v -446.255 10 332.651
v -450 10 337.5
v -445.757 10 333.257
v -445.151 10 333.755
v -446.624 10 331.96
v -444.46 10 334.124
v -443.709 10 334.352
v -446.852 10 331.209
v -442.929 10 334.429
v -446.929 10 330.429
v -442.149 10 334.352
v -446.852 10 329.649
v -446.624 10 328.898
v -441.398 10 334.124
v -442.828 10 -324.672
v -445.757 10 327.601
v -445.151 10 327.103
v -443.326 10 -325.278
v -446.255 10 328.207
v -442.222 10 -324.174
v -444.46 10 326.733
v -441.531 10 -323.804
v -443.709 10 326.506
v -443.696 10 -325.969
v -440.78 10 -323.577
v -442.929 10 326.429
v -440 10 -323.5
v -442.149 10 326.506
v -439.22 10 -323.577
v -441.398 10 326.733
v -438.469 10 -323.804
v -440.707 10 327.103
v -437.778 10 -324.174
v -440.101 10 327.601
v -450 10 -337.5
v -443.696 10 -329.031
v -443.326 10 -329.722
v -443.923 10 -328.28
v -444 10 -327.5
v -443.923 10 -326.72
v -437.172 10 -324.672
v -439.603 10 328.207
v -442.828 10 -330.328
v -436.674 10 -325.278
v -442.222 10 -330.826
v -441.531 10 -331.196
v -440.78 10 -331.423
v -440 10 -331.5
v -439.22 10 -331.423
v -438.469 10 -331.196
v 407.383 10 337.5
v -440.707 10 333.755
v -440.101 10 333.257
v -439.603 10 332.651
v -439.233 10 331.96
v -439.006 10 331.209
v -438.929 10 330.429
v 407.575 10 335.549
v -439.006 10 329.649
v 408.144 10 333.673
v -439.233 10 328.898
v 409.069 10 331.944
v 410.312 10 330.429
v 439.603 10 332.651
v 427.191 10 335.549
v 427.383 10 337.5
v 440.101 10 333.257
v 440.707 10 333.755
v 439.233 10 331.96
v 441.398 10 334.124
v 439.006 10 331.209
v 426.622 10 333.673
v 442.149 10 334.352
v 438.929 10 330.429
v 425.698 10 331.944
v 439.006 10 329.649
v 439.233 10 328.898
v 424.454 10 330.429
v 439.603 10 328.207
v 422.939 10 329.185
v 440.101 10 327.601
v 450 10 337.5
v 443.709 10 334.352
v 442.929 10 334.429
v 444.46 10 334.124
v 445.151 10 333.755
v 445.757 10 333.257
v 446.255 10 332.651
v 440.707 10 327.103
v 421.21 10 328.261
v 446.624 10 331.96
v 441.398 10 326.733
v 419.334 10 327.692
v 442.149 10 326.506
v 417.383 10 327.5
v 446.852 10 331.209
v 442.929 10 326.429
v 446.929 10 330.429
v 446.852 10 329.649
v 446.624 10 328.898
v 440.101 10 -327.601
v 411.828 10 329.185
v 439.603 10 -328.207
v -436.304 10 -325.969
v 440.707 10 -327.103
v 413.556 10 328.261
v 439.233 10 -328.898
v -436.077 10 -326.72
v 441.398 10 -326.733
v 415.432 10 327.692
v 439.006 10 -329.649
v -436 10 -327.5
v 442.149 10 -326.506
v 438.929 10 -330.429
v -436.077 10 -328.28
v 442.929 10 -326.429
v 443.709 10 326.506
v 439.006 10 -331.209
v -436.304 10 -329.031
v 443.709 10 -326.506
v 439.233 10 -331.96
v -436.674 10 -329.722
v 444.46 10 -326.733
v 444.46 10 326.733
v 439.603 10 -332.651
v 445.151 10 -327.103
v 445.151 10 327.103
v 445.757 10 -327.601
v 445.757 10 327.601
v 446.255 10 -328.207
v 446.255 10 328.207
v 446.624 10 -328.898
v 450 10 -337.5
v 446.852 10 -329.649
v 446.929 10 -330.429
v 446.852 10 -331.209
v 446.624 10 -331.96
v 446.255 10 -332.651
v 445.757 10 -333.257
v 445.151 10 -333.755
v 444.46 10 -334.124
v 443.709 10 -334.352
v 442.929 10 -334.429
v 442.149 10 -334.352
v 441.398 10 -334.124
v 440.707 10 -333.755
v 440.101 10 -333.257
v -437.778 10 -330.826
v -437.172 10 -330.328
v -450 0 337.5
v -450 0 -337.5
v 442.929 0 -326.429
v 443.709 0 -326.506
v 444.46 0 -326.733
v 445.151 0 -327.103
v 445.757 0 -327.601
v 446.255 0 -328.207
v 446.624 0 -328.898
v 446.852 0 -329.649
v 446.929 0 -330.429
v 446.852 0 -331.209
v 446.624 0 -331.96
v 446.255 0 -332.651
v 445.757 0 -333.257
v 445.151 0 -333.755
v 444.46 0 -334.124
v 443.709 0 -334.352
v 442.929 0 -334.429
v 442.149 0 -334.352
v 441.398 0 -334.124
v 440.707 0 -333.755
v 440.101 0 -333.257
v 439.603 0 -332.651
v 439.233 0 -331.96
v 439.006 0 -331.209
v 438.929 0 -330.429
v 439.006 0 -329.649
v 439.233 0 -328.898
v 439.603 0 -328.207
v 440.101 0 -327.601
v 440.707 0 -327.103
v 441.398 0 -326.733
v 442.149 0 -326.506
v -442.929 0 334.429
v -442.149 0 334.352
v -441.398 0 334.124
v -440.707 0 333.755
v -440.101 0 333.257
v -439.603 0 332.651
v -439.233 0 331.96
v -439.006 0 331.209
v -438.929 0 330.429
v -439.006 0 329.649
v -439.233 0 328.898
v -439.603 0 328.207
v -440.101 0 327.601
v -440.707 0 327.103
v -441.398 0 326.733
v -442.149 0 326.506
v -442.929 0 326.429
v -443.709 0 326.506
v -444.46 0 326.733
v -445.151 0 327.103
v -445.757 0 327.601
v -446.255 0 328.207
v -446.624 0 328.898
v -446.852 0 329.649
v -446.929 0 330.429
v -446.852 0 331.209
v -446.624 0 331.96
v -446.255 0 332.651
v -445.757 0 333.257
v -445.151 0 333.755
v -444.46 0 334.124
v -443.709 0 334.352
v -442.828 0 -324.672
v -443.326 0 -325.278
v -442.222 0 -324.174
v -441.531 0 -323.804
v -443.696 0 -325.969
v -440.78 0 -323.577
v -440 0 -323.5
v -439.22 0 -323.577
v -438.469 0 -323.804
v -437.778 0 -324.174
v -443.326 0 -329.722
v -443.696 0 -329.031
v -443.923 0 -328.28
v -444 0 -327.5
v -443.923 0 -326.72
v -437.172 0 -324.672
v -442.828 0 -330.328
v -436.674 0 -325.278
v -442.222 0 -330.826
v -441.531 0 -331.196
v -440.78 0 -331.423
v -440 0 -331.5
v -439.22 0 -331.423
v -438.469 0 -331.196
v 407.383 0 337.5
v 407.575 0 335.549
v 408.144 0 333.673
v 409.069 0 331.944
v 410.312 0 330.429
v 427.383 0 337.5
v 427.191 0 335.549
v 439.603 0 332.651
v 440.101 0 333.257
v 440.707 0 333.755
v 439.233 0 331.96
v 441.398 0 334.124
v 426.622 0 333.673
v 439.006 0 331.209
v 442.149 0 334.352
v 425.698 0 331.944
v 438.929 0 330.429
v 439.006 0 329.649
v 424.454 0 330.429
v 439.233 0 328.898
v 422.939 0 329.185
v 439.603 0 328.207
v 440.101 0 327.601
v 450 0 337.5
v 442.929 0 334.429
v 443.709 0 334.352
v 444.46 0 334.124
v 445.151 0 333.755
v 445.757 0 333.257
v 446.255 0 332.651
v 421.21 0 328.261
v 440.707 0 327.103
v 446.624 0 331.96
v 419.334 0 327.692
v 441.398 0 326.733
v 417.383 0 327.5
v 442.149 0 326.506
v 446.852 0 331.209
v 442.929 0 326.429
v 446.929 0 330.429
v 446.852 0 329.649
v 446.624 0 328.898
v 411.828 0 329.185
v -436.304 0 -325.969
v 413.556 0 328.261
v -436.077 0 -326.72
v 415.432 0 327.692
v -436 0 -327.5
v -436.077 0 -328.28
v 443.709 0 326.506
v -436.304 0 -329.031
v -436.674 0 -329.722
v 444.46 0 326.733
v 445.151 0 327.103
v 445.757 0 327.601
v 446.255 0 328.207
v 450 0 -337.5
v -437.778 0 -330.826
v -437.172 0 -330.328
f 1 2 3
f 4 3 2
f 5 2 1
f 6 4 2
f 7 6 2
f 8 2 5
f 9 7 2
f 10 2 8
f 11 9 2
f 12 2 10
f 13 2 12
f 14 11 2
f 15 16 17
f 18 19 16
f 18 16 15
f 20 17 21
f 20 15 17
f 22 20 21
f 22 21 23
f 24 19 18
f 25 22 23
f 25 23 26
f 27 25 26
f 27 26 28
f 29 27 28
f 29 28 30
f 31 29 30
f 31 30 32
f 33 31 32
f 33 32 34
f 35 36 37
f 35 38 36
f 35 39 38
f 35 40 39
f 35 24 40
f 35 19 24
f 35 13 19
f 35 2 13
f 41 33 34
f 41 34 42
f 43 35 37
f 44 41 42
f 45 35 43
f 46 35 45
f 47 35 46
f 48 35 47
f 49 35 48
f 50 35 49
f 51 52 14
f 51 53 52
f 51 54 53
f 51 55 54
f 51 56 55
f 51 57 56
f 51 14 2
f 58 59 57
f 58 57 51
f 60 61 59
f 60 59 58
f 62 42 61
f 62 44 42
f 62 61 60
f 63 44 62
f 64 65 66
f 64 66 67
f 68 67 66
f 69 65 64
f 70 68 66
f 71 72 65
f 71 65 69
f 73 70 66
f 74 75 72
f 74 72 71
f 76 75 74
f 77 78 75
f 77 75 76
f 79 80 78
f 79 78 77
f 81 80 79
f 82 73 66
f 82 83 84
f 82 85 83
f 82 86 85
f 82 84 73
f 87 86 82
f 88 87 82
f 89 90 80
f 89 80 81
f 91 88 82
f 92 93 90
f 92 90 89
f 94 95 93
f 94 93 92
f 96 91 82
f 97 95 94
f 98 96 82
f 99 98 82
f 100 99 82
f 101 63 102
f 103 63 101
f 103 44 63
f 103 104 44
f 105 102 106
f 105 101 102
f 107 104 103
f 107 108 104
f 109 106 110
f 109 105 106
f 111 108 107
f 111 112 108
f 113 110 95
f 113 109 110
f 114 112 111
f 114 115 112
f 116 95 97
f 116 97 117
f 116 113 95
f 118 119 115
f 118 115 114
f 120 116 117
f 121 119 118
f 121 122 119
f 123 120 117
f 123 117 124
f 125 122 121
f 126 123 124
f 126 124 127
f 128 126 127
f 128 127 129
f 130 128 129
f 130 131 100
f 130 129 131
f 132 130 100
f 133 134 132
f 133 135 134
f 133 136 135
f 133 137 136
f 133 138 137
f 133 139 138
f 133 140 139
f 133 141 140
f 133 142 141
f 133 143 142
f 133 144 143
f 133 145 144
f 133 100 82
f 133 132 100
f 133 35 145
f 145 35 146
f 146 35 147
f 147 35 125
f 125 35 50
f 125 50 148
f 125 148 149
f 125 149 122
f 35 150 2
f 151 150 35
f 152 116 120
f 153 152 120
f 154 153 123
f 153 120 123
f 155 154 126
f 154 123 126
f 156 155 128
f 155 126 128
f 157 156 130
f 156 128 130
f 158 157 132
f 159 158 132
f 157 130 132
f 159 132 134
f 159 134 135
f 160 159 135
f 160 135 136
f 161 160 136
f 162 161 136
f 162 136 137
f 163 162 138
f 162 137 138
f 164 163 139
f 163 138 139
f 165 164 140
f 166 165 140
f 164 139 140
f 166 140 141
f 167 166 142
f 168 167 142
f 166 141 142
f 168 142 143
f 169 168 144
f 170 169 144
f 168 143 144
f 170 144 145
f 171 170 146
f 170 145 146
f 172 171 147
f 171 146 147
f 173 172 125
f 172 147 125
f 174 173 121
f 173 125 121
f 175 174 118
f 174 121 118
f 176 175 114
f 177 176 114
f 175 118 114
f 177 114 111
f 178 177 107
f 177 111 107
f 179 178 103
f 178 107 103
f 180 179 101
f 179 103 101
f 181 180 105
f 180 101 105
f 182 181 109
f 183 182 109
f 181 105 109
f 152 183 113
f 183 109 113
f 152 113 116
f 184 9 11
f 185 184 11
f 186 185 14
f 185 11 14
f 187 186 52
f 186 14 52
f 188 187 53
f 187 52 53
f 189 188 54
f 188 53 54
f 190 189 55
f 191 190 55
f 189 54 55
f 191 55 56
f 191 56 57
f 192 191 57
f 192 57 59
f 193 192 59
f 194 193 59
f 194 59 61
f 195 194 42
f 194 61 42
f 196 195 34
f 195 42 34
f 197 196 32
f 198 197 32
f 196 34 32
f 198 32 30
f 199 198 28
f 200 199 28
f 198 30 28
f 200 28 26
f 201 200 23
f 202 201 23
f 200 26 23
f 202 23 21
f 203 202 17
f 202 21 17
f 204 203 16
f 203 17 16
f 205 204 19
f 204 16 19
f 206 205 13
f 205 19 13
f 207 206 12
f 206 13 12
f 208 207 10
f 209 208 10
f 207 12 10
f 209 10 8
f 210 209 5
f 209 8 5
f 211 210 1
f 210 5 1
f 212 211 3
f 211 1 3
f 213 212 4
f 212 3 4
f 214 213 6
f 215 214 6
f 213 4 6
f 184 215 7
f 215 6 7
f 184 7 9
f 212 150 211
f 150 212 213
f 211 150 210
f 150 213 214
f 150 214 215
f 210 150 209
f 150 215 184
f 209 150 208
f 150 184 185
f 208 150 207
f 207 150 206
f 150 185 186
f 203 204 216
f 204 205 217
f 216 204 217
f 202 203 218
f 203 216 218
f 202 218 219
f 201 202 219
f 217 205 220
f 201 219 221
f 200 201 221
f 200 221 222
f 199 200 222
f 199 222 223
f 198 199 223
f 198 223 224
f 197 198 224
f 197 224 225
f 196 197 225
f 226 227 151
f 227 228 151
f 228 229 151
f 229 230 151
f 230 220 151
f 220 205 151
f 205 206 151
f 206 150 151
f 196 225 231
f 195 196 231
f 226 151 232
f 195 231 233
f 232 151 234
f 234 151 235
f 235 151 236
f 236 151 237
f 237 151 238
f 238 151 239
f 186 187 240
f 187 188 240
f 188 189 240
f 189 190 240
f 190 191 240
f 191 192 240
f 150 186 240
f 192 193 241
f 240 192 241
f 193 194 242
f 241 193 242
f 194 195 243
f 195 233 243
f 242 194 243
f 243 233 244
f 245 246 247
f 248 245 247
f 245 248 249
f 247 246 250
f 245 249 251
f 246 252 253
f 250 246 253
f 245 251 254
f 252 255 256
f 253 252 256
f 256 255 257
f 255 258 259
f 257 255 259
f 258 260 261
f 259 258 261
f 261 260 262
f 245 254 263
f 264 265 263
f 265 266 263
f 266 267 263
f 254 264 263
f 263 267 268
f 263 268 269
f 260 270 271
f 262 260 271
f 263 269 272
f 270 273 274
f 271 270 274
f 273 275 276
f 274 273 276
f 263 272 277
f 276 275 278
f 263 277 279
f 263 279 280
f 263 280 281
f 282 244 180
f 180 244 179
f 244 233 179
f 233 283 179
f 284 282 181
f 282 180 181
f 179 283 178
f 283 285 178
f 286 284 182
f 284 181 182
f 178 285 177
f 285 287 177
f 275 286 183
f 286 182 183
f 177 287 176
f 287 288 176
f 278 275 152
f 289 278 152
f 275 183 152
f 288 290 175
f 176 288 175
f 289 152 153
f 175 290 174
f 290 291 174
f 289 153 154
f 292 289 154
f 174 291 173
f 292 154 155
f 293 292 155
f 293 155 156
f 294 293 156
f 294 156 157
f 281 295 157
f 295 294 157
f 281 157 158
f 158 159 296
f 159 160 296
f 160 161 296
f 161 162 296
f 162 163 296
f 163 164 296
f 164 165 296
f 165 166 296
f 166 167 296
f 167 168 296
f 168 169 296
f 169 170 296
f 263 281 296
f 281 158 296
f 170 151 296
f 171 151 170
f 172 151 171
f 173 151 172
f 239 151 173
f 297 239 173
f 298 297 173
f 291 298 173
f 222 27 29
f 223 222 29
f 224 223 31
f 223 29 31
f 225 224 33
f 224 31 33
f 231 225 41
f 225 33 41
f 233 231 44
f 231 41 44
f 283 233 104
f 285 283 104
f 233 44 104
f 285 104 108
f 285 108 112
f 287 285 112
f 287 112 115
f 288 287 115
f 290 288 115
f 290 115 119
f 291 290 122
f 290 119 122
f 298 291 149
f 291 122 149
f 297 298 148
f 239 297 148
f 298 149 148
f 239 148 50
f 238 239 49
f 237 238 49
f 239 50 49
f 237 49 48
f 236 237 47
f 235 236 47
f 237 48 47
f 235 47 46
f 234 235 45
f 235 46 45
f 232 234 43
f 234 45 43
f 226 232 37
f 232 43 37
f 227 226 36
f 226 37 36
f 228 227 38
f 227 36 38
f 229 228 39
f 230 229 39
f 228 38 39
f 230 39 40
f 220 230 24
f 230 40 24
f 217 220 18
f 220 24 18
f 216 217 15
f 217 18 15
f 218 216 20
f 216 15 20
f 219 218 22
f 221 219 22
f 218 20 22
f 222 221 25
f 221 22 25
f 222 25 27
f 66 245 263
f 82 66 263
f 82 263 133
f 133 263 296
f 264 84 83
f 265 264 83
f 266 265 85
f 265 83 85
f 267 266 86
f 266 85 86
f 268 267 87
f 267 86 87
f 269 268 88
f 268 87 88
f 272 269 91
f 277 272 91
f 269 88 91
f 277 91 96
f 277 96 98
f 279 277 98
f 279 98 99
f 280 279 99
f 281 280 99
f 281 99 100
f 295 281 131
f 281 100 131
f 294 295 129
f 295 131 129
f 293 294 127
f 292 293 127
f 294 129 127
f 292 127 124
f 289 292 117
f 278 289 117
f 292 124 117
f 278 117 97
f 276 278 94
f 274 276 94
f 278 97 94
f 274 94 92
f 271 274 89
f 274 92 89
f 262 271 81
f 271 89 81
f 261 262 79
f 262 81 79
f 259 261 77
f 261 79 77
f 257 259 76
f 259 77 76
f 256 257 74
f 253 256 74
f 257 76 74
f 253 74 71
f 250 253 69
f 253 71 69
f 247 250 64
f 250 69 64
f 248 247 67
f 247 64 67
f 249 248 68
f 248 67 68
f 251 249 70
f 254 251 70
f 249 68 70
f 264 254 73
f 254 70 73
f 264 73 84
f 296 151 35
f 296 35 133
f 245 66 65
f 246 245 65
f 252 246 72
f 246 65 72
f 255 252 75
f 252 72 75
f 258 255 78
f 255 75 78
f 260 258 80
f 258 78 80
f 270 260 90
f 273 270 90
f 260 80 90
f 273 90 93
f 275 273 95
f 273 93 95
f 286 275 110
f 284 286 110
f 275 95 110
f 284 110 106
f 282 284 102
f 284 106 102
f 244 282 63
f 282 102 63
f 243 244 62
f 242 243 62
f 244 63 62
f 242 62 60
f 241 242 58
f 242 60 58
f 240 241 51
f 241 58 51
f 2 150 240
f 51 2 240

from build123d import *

# Parameters (mm, degrees)
SKETCH1_W           = 900
SKETCH1_H           = 675
BOSS_EXTRUDE1_DEPTH = 10
SKETCH3_R           = 4
CUT_EXTRUDE1_DEPTH  = 10
SKETCH4_R           = 4
CUT_EXTRUDE2_DEPTH  = 10
SKETCH5_R           = 4
CUT_EXTRUDE3_DEPTH  = 10
SKETCH6_R           = 4
CUT_EXTRUDE4_DEPTH  = 10
SKETCH7_R           = 10
CUT_EXTRUDE5_DEPTH  = 10


with BuildPart() as part:
    # Sketch1 → Boss-Extrude1 (new body)
    with BuildSketch(Plane(origin=(0, 0, 0), x_dir=(1, 0, 0), z_dir=(0, 1, 0))):
        Rectangle(SKETCH1_W, SKETCH1_H)
    extrude(amount=BOSS_EXTRUDE1_DEPTH)

    # Sketch3 → Cut-Extrude1 (cut)
    with BuildSketch(Plane(origin=(0, 10, 0), x_dir=(1, 0, 0), z_dir=(0, 1, 0))):
        with Locations(Location((-440, 327.5, 0), (0, 0, 270))):
            Circle(SKETCH3_R)
    extrude(amount=-CUT_EXTRUDE1_DEPTH, mode=Mode.SUBTRACT)

    # Sketch4 → Cut-Extrude2 (cut)
    with BuildSketch(Plane(origin=(0, 10, 0), x_dir=(1, 0, 0), z_dir=(0, 1, 0))):
        with Locations(Location((-442.928932188, -330.428932188, 0), (0, 0, 270))):
            Circle(SKETCH4_R)
    extrude(amount=-CUT_EXTRUDE2_DEPTH, mode=Mode.SUBTRACT)

    # Sketch5 → Cut-Extrude3 (cut)
    with BuildSketch(Plane(origin=(0, 10, 0), x_dir=(1, 0, 0), z_dir=(0, 1, 0))):
        with Locations(Location((442.928932188, 330.428932188, 0), (0, 0, 270))):
            Circle(SKETCH5_R)
    extrude(amount=-CUT_EXTRUDE3_DEPTH, mode=Mode.SUBTRACT)

    # Sketch6 → Cut-Extrude4 (cut)
    with BuildSketch(Plane(origin=(0, 10, 0), x_dir=(1, 0, 0), z_dir=(0, 1, 0))):
        with Locations(Location((442.928932188, -330.428932188, 0), (0, 0, 270))):
            Circle(SKETCH6_R)
    extrude(amount=-CUT_EXTRUDE4_DEPTH, mode=Mode.SUBTRACT)

    # Sketch7 → Cut-Extrude5 (cut)
    with BuildSketch(Plane(origin=(0, 10, 0), x_dir=(1, 0, 0), z_dir=(0, 1, 0))):
        with Locations((417.383273444, -337.5)):
            Circle(SKETCH7_R)
    extrude(amount=-CUT_EXTRUDE5_DEPTH, mode=Mode.SUBTRACT)


solid = part.part
